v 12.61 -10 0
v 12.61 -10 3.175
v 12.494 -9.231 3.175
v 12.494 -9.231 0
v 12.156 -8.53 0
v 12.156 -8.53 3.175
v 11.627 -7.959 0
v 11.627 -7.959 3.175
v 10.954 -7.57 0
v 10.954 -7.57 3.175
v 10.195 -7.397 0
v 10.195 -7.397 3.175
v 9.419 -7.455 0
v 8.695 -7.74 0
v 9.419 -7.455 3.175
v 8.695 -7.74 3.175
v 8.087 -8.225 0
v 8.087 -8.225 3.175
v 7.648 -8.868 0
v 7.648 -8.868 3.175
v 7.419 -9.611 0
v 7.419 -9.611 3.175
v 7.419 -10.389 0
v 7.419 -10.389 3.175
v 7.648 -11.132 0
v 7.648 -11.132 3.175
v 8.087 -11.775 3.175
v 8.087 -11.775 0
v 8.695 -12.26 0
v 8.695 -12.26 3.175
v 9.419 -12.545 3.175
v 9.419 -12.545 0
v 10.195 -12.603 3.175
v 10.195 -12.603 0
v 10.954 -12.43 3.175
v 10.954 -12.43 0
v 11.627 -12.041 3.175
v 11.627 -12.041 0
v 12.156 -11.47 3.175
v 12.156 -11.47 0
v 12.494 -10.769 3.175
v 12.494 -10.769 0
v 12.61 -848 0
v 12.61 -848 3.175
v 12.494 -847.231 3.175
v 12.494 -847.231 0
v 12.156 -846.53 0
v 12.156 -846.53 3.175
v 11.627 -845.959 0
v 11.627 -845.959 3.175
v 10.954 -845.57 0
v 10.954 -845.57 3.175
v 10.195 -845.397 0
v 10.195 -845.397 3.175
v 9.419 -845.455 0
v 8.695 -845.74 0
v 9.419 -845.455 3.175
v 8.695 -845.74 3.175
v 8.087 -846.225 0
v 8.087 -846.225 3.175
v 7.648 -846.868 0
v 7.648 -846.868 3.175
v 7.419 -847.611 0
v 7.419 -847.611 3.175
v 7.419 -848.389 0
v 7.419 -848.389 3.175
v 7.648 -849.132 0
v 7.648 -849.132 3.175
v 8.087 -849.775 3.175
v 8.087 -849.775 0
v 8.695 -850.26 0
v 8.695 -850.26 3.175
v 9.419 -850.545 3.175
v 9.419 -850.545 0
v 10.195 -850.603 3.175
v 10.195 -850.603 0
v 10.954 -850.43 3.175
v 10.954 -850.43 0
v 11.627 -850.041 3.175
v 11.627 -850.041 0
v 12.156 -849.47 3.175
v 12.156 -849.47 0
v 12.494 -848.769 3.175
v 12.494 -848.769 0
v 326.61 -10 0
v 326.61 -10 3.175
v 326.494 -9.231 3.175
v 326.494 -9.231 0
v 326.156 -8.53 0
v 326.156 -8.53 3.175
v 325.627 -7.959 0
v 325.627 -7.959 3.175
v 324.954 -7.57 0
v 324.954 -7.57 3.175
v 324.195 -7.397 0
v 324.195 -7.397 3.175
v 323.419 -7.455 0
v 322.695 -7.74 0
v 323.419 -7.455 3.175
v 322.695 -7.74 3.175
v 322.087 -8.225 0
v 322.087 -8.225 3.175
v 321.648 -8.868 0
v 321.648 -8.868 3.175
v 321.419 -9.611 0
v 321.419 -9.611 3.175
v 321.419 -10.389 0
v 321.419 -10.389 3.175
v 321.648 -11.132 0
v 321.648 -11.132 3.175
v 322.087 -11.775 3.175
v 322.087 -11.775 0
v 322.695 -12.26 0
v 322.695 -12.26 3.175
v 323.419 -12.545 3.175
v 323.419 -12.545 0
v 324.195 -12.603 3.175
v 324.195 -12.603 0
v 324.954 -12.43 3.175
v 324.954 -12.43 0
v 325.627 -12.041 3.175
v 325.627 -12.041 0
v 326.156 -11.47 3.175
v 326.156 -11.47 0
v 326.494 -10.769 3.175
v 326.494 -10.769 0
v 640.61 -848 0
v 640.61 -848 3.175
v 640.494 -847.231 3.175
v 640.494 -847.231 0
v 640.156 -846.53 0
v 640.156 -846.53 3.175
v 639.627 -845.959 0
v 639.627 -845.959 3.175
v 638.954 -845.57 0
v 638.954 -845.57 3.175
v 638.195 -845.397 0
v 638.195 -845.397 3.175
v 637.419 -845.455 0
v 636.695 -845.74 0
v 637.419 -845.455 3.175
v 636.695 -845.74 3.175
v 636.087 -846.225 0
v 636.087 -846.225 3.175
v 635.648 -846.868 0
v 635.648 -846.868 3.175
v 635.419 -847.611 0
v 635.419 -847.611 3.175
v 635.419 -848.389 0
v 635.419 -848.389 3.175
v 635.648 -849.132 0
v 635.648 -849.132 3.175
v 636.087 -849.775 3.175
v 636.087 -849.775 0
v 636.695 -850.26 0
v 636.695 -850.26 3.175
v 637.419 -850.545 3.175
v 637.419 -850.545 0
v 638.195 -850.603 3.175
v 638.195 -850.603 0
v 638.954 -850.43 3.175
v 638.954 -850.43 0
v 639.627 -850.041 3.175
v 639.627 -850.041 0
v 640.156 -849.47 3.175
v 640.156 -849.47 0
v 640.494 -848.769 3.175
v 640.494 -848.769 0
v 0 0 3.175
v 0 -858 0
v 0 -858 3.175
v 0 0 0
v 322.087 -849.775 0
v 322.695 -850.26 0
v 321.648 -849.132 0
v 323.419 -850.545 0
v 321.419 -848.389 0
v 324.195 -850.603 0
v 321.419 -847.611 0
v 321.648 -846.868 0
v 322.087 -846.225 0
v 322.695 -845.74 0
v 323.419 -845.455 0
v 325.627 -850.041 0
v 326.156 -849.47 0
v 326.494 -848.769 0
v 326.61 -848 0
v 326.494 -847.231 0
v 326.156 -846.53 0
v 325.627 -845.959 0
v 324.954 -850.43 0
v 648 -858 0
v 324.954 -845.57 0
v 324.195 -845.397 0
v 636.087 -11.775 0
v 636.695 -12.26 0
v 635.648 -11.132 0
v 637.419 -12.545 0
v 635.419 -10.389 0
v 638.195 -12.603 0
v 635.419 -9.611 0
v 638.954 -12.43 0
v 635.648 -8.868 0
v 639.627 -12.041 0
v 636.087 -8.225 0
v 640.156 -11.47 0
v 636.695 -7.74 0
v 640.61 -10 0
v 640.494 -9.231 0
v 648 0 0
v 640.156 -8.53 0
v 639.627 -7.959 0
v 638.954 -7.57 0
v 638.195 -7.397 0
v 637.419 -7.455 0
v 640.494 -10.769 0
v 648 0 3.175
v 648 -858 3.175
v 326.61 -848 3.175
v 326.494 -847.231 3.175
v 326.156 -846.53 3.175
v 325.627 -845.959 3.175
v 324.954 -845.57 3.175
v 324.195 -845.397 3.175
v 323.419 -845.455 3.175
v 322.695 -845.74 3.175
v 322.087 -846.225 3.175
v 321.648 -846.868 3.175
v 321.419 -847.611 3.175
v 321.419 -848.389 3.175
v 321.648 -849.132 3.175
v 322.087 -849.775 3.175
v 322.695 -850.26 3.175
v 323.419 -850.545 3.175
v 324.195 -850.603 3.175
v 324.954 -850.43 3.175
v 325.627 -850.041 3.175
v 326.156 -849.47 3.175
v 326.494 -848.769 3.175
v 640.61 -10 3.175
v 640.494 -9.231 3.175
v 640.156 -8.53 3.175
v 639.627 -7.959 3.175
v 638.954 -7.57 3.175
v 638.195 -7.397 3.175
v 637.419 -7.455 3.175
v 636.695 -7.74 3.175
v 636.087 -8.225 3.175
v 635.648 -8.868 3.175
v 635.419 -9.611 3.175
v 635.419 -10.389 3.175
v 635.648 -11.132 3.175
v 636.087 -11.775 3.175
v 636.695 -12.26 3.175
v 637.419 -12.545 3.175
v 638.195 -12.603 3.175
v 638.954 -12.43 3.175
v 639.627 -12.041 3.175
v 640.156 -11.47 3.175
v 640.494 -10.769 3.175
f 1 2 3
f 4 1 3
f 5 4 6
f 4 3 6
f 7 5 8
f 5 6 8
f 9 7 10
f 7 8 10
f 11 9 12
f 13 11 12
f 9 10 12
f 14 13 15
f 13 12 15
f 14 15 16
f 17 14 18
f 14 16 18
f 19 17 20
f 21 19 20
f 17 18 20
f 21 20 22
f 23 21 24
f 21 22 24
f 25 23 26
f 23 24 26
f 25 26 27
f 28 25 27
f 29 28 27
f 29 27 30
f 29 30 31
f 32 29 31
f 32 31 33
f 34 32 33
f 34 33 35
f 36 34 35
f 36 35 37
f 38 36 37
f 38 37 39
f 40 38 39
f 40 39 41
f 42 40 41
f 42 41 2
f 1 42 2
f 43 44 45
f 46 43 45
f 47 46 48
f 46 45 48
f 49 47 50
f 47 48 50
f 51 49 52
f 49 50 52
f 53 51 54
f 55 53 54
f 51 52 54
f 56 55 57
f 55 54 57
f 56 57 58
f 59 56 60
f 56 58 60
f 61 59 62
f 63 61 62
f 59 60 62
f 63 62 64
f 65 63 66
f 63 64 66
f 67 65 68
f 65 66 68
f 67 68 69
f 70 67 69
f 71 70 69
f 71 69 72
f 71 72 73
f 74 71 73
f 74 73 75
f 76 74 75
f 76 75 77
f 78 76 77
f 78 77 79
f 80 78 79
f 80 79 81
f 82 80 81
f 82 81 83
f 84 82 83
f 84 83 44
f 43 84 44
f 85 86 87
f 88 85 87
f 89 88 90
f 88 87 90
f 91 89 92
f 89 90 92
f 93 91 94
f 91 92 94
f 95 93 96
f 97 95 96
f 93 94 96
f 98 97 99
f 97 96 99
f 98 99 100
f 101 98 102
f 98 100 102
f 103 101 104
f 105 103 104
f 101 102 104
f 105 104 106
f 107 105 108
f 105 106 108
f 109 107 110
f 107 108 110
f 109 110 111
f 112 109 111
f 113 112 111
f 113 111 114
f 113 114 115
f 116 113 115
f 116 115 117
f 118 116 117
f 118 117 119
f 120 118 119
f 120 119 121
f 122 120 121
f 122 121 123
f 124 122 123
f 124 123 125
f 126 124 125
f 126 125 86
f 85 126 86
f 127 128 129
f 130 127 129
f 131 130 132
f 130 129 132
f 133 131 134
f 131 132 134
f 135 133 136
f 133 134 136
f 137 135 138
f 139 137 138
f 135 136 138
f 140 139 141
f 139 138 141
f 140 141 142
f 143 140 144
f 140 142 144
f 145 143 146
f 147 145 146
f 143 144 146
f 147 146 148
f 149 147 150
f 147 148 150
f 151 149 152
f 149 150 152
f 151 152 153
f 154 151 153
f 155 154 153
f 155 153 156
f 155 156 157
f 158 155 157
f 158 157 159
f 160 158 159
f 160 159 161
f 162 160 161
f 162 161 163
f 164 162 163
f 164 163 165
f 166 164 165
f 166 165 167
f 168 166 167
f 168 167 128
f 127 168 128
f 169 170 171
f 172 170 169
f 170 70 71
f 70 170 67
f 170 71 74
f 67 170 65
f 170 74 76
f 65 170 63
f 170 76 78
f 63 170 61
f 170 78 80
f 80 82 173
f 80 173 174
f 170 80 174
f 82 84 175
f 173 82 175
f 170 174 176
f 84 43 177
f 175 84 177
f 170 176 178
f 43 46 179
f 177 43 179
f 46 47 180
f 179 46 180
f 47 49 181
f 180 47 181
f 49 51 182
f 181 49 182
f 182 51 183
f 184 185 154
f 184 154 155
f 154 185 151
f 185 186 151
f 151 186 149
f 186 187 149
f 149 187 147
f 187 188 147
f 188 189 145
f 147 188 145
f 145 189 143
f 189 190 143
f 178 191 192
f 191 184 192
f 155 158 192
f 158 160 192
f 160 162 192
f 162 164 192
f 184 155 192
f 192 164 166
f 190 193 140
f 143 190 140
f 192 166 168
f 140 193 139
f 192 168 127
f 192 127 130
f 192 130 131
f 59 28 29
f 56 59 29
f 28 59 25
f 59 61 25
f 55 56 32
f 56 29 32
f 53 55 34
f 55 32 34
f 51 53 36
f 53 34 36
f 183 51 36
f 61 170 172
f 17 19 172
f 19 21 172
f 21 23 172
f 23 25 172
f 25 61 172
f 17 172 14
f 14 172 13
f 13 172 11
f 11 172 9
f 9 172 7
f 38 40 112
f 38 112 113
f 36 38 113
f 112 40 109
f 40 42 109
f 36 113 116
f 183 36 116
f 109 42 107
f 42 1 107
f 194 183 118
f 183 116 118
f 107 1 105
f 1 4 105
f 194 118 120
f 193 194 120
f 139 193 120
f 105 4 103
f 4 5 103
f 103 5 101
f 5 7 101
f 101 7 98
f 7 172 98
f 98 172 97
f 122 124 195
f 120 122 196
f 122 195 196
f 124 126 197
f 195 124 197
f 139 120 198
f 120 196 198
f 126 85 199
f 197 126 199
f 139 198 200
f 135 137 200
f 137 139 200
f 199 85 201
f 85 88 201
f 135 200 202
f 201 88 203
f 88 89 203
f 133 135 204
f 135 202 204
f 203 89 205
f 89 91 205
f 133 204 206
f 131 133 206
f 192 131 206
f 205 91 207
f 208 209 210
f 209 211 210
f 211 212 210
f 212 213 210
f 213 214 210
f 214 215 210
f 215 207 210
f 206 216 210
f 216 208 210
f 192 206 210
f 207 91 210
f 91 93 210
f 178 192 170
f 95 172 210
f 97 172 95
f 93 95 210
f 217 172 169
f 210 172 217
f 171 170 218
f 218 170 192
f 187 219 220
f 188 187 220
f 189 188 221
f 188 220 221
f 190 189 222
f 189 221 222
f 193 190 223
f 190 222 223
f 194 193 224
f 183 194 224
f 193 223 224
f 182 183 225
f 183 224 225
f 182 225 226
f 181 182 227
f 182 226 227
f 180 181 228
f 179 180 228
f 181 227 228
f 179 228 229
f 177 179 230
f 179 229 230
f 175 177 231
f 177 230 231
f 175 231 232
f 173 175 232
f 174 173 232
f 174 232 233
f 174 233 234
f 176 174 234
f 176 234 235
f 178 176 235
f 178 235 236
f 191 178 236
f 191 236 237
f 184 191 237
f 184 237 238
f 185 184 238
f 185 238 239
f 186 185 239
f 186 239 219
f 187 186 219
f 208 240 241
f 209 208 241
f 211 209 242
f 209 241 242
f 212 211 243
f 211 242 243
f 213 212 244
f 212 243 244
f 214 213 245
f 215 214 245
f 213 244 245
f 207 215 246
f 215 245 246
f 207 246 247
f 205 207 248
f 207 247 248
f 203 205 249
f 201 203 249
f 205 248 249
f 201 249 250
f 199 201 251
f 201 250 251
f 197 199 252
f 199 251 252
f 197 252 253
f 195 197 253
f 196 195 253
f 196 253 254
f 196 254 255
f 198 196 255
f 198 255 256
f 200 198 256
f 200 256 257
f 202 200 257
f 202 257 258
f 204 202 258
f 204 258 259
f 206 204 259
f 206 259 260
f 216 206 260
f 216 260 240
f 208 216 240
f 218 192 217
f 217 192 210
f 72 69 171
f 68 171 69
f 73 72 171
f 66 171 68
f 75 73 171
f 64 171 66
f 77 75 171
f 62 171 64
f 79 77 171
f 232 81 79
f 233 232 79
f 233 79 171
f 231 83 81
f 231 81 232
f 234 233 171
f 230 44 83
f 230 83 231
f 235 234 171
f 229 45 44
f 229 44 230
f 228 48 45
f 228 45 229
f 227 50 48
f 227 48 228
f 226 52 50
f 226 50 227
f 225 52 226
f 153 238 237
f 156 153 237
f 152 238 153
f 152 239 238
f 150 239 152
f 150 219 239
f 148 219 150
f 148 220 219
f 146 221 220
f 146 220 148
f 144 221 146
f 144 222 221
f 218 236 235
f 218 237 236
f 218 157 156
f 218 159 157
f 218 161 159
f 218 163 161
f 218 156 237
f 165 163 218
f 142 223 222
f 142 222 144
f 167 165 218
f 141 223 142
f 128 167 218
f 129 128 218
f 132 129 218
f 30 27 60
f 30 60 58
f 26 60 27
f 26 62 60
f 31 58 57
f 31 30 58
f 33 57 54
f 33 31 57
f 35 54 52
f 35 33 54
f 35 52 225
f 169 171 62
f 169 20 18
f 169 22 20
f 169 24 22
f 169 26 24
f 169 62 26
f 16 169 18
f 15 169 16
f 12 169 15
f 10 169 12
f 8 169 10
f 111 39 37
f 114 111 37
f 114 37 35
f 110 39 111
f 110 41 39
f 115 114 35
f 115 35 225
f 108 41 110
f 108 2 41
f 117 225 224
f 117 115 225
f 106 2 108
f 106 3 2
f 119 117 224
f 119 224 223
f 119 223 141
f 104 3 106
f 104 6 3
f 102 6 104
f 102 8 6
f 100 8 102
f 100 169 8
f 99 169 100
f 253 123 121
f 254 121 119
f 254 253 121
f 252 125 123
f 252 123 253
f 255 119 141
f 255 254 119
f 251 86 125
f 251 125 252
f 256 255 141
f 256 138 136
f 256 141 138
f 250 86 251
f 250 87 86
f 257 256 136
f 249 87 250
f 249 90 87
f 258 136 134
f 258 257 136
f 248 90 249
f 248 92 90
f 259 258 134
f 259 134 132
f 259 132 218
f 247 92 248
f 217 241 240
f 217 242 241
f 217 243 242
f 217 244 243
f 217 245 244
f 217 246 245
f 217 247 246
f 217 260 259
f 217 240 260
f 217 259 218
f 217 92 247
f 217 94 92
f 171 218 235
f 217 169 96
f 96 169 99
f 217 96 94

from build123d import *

# Parameters (mm, degrees)
SKETCH1_W           = 648
SKETCH1_H           = 858
BOSS_EXTRUDE1_DEPTH = 3.175
CUT_EXTRUDE1_REACH  = 1077.211
SKETCH2_R           = 2.61


with BuildPart() as part:
    # Sketch1 → Boss-Extrude1 (new body)
    with BuildSketch(Plane.XY):
        with Locations((324, -429)):
            Rectangle(SKETCH1_W, SKETCH1_H)
    extrude(amount=BOSS_EXTRUDE1_DEPTH)

    # Sketch2 → Cut-Extrude1 (cut, up to next)
    with BuildSketch(Plane.XY.offset(3.175), mode=Mode.PRIVATE) as cut_extrude1_sk1:
        with Locations((10, -848)):
            Circle(SKETCH2_R)
    cut_extrude1_tool1 = extrude(cut_extrude1_sk1.sketch, amount=-CUT_EXTRUDE1_REACH, mode=Mode.PRIVATE) & part.part
    # Sketch2 → Cut-Extrude1 (cut, up to next)
    with BuildSketch(Plane.XY.offset(3.175), mode=Mode.PRIVATE) as cut_extrude1_sk2:
        with Locations((324, -848)):
            Circle(SKETCH2_R)
    cut_extrude1_tool2 = extrude(cut_extrude1_sk2.sketch, amount=-CUT_EXTRUDE1_REACH, mode=Mode.PRIVATE) & part.part
    # Sketch2 → Cut-Extrude1 (cut, up to next)
    with BuildSketch(Plane.XY.offset(3.175), mode=Mode.PRIVATE) as cut_extrude1_sk3:
        with Locations((638, -848)):
            Circle(SKETCH2_R)
    cut_extrude1_tool3 = extrude(cut_extrude1_sk3.sketch, amount=-CUT_EXTRUDE1_REACH, mode=Mode.PRIVATE) & part.part
    # Sketch2 → Cut-Extrude1 (cut, up to next)
    with BuildSketch(Plane.XY.offset(3.175), mode=Mode.PRIVATE) as cut_extrude1_sk4:
        with Locations((638, -10)):
            Circle(SKETCH2_R)
    cut_extrude1_tool4 = extrude(cut_extrude1_sk4.sketch, amount=-CUT_EXTRUDE1_REACH, mode=Mode.PRIVATE) & part.part
    # Sketch2 → Cut-Extrude1 (cut, up to next)
    with BuildSketch(Plane.XY.offset(3.175), mode=Mode.PRIVATE) as cut_extrude1_sk5:
        with Locations((324, -10)):
            Circle(SKETCH2_R)
    cut_extrude1_tool5 = extrude(cut_extrude1_sk5.sketch, amount=-CUT_EXTRUDE1_REACH, mode=Mode.PRIVATE) & part.part
    # Sketch2 → Cut-Extrude1 (cut, up to next)
    with BuildSketch(Plane.XY.offset(3.175), mode=Mode.PRIVATE) as cut_extrude1_sk6:
        with Locations((10, -10)):
            Circle(SKETCH2_R)
    cut_extrude1_tool6 = extrude(cut_extrude1_sk6.sketch, amount=-CUT_EXTRUDE1_REACH, mode=Mode.PRIVATE) & part.part
    add(cut_extrude1_tool1.solids().sort_by_distance((10, -848, 3.175))[0], mode=Mode.SUBTRACT)
    add(cut_extrude1_tool2.solids().sort_by_distance((324, -848, 3.175))[0], mode=Mode.SUBTRACT)
    add(cut_extrude1_tool3.solids().sort_by_distance((638, -848, 3.175))[0], mode=Mode.SUBTRACT)
    add(cut_extrude1_tool4.solids().sort_by_distance((638, -10, 3.175))[0], mode=Mode.SUBTRACT)
    add(cut_extrude1_tool5.solids().sort_by_distance((324, -10, 3.175))[0], mode=Mode.SUBTRACT)
    add(cut_extrude1_tool6.solids().sort_by_distance((10, -10, 3.175))[0], mode=Mode.SUBTRACT)


solid = part.part
